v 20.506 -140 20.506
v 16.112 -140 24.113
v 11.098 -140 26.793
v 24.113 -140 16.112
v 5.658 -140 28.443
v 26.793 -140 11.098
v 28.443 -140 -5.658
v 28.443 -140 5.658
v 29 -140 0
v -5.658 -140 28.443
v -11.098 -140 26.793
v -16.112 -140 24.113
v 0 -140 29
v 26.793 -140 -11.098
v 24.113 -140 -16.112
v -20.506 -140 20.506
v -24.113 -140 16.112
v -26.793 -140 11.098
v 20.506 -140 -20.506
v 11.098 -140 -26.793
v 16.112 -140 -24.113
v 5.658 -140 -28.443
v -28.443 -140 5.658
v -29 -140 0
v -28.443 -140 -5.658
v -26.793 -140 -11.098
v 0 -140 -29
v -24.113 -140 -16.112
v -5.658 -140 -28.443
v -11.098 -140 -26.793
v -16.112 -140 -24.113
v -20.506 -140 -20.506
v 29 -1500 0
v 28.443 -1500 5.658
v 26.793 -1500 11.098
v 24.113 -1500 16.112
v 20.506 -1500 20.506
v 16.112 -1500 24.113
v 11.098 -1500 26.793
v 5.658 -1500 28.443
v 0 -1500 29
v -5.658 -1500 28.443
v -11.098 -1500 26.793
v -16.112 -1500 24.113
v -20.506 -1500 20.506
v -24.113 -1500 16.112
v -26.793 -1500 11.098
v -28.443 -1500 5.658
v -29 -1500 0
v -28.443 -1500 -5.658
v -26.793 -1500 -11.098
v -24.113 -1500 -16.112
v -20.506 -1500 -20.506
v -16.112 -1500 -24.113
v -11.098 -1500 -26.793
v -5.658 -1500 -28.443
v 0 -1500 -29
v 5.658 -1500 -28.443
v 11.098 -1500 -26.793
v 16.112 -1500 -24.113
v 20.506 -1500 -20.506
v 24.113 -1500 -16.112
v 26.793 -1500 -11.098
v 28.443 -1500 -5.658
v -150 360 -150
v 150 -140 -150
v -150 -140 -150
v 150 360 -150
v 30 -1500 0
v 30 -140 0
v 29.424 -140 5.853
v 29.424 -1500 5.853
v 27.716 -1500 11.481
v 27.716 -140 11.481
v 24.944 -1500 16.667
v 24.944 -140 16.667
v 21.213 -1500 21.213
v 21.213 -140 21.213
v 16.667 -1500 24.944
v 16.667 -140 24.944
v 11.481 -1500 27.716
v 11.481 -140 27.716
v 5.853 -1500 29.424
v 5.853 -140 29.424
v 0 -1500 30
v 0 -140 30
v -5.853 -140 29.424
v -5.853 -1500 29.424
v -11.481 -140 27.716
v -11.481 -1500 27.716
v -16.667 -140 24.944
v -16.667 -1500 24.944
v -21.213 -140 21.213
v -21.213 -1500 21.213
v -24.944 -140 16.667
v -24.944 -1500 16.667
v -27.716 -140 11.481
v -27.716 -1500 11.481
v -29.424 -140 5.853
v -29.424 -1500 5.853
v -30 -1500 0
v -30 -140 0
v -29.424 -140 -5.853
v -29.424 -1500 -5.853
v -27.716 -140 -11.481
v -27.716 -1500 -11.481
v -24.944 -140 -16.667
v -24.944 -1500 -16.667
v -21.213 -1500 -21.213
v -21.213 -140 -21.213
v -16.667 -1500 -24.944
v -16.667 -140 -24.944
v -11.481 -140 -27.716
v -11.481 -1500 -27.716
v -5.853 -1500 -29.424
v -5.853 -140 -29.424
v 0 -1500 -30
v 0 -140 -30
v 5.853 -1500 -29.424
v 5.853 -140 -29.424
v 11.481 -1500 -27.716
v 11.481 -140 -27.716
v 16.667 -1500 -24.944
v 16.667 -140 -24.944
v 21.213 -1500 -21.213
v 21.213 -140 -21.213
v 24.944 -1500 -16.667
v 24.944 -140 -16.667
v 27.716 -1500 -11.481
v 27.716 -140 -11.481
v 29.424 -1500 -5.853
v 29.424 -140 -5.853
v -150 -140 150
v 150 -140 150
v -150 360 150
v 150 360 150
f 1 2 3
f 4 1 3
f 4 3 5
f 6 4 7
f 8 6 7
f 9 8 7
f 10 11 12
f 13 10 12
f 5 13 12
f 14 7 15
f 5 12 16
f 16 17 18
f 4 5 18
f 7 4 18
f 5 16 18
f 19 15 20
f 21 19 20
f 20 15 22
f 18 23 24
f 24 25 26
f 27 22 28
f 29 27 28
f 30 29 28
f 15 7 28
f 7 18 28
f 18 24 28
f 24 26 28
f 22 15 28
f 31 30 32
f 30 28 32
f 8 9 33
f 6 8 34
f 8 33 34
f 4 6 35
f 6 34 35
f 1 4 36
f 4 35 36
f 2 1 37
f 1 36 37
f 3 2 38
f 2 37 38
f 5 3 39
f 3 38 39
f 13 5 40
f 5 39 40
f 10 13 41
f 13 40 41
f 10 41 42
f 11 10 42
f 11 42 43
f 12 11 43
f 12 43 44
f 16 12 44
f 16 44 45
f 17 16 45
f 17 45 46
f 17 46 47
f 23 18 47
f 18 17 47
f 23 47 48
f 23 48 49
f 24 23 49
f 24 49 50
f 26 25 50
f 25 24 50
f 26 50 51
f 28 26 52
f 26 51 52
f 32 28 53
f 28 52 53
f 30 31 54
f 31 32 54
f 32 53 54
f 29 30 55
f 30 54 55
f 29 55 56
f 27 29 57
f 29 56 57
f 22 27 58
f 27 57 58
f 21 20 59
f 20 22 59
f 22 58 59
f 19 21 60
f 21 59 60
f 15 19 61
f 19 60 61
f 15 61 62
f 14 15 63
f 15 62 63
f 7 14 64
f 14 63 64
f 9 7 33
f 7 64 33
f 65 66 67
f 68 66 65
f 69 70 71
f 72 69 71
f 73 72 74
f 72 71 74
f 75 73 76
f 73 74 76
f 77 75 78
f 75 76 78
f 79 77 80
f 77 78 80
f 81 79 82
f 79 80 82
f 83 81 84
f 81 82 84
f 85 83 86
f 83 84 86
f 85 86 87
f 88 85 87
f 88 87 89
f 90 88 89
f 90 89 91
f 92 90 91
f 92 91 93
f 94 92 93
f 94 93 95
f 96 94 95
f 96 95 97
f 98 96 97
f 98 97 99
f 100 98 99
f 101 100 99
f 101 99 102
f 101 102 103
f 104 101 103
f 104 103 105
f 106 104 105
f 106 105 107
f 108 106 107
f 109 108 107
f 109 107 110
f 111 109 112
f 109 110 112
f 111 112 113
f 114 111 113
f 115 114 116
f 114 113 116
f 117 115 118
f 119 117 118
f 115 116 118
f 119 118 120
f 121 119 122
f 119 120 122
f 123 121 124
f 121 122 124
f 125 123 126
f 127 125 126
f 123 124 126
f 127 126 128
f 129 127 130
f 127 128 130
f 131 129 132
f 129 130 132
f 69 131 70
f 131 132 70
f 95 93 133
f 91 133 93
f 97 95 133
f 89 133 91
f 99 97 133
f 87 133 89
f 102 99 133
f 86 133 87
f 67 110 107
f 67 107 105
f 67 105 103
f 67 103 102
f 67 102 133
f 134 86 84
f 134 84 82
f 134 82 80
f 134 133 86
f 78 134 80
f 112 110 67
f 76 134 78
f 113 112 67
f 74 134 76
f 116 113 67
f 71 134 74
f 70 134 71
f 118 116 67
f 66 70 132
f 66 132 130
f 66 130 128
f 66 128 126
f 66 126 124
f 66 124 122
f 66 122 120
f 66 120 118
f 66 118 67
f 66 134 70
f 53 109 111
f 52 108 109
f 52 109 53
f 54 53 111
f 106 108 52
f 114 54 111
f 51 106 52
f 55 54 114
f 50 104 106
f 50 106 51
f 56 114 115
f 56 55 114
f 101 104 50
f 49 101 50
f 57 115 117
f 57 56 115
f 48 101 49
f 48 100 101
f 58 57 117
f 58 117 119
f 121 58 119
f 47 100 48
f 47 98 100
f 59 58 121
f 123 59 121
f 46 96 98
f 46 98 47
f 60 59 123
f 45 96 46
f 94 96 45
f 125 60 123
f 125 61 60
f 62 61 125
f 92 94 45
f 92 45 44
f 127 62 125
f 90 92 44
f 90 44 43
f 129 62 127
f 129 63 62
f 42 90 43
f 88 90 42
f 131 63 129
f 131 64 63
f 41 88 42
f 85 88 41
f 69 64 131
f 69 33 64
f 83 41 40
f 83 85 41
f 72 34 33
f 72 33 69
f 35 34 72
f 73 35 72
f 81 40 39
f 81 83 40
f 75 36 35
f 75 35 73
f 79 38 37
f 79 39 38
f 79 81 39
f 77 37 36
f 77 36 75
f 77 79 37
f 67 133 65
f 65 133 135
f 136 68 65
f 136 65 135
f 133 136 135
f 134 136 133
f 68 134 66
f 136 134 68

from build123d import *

# Parameters (mm, degrees)
F0_R          = 30
F1_DEPTH      = 1500
F2_R          = 29
F3_DEPTH      = 1500
F7_DEPTH      = 150
F7_DEPTH_BACK = 150


# Not quite as in the source:
# - the program builds the solid bodies; features that only make, move or delete a surface that nothing else refers to are left out


with BuildPart() as f1:
    # F0 (on Front) → F1 (new body)
    with BuildSketch(Plane.XZ):
        Circle(F0_R)
    extrude(amount=F1_DEPTH)

    # F2 (on face) → F3 (cut)
    with BuildSketch(Plane.XZ.offset(1500)):
        Circle(F2_R)
    extrude(amount=-F3_DEPTH, mode=Mode.SUBTRACT)

    # F6 (on Right) → F7 (join, two sides)
    with BuildSketch(Plane.YZ) as f7_sk:
        Polygon((-140, 150), (-140, 0), (-140, -150), (360, -150), (360, 150), align=None)
    extrude(amount=F7_DEPTH)
    extrude(f7_sk.sketch, amount=-F7_DEPTH_BACK)


solid = f1.part
